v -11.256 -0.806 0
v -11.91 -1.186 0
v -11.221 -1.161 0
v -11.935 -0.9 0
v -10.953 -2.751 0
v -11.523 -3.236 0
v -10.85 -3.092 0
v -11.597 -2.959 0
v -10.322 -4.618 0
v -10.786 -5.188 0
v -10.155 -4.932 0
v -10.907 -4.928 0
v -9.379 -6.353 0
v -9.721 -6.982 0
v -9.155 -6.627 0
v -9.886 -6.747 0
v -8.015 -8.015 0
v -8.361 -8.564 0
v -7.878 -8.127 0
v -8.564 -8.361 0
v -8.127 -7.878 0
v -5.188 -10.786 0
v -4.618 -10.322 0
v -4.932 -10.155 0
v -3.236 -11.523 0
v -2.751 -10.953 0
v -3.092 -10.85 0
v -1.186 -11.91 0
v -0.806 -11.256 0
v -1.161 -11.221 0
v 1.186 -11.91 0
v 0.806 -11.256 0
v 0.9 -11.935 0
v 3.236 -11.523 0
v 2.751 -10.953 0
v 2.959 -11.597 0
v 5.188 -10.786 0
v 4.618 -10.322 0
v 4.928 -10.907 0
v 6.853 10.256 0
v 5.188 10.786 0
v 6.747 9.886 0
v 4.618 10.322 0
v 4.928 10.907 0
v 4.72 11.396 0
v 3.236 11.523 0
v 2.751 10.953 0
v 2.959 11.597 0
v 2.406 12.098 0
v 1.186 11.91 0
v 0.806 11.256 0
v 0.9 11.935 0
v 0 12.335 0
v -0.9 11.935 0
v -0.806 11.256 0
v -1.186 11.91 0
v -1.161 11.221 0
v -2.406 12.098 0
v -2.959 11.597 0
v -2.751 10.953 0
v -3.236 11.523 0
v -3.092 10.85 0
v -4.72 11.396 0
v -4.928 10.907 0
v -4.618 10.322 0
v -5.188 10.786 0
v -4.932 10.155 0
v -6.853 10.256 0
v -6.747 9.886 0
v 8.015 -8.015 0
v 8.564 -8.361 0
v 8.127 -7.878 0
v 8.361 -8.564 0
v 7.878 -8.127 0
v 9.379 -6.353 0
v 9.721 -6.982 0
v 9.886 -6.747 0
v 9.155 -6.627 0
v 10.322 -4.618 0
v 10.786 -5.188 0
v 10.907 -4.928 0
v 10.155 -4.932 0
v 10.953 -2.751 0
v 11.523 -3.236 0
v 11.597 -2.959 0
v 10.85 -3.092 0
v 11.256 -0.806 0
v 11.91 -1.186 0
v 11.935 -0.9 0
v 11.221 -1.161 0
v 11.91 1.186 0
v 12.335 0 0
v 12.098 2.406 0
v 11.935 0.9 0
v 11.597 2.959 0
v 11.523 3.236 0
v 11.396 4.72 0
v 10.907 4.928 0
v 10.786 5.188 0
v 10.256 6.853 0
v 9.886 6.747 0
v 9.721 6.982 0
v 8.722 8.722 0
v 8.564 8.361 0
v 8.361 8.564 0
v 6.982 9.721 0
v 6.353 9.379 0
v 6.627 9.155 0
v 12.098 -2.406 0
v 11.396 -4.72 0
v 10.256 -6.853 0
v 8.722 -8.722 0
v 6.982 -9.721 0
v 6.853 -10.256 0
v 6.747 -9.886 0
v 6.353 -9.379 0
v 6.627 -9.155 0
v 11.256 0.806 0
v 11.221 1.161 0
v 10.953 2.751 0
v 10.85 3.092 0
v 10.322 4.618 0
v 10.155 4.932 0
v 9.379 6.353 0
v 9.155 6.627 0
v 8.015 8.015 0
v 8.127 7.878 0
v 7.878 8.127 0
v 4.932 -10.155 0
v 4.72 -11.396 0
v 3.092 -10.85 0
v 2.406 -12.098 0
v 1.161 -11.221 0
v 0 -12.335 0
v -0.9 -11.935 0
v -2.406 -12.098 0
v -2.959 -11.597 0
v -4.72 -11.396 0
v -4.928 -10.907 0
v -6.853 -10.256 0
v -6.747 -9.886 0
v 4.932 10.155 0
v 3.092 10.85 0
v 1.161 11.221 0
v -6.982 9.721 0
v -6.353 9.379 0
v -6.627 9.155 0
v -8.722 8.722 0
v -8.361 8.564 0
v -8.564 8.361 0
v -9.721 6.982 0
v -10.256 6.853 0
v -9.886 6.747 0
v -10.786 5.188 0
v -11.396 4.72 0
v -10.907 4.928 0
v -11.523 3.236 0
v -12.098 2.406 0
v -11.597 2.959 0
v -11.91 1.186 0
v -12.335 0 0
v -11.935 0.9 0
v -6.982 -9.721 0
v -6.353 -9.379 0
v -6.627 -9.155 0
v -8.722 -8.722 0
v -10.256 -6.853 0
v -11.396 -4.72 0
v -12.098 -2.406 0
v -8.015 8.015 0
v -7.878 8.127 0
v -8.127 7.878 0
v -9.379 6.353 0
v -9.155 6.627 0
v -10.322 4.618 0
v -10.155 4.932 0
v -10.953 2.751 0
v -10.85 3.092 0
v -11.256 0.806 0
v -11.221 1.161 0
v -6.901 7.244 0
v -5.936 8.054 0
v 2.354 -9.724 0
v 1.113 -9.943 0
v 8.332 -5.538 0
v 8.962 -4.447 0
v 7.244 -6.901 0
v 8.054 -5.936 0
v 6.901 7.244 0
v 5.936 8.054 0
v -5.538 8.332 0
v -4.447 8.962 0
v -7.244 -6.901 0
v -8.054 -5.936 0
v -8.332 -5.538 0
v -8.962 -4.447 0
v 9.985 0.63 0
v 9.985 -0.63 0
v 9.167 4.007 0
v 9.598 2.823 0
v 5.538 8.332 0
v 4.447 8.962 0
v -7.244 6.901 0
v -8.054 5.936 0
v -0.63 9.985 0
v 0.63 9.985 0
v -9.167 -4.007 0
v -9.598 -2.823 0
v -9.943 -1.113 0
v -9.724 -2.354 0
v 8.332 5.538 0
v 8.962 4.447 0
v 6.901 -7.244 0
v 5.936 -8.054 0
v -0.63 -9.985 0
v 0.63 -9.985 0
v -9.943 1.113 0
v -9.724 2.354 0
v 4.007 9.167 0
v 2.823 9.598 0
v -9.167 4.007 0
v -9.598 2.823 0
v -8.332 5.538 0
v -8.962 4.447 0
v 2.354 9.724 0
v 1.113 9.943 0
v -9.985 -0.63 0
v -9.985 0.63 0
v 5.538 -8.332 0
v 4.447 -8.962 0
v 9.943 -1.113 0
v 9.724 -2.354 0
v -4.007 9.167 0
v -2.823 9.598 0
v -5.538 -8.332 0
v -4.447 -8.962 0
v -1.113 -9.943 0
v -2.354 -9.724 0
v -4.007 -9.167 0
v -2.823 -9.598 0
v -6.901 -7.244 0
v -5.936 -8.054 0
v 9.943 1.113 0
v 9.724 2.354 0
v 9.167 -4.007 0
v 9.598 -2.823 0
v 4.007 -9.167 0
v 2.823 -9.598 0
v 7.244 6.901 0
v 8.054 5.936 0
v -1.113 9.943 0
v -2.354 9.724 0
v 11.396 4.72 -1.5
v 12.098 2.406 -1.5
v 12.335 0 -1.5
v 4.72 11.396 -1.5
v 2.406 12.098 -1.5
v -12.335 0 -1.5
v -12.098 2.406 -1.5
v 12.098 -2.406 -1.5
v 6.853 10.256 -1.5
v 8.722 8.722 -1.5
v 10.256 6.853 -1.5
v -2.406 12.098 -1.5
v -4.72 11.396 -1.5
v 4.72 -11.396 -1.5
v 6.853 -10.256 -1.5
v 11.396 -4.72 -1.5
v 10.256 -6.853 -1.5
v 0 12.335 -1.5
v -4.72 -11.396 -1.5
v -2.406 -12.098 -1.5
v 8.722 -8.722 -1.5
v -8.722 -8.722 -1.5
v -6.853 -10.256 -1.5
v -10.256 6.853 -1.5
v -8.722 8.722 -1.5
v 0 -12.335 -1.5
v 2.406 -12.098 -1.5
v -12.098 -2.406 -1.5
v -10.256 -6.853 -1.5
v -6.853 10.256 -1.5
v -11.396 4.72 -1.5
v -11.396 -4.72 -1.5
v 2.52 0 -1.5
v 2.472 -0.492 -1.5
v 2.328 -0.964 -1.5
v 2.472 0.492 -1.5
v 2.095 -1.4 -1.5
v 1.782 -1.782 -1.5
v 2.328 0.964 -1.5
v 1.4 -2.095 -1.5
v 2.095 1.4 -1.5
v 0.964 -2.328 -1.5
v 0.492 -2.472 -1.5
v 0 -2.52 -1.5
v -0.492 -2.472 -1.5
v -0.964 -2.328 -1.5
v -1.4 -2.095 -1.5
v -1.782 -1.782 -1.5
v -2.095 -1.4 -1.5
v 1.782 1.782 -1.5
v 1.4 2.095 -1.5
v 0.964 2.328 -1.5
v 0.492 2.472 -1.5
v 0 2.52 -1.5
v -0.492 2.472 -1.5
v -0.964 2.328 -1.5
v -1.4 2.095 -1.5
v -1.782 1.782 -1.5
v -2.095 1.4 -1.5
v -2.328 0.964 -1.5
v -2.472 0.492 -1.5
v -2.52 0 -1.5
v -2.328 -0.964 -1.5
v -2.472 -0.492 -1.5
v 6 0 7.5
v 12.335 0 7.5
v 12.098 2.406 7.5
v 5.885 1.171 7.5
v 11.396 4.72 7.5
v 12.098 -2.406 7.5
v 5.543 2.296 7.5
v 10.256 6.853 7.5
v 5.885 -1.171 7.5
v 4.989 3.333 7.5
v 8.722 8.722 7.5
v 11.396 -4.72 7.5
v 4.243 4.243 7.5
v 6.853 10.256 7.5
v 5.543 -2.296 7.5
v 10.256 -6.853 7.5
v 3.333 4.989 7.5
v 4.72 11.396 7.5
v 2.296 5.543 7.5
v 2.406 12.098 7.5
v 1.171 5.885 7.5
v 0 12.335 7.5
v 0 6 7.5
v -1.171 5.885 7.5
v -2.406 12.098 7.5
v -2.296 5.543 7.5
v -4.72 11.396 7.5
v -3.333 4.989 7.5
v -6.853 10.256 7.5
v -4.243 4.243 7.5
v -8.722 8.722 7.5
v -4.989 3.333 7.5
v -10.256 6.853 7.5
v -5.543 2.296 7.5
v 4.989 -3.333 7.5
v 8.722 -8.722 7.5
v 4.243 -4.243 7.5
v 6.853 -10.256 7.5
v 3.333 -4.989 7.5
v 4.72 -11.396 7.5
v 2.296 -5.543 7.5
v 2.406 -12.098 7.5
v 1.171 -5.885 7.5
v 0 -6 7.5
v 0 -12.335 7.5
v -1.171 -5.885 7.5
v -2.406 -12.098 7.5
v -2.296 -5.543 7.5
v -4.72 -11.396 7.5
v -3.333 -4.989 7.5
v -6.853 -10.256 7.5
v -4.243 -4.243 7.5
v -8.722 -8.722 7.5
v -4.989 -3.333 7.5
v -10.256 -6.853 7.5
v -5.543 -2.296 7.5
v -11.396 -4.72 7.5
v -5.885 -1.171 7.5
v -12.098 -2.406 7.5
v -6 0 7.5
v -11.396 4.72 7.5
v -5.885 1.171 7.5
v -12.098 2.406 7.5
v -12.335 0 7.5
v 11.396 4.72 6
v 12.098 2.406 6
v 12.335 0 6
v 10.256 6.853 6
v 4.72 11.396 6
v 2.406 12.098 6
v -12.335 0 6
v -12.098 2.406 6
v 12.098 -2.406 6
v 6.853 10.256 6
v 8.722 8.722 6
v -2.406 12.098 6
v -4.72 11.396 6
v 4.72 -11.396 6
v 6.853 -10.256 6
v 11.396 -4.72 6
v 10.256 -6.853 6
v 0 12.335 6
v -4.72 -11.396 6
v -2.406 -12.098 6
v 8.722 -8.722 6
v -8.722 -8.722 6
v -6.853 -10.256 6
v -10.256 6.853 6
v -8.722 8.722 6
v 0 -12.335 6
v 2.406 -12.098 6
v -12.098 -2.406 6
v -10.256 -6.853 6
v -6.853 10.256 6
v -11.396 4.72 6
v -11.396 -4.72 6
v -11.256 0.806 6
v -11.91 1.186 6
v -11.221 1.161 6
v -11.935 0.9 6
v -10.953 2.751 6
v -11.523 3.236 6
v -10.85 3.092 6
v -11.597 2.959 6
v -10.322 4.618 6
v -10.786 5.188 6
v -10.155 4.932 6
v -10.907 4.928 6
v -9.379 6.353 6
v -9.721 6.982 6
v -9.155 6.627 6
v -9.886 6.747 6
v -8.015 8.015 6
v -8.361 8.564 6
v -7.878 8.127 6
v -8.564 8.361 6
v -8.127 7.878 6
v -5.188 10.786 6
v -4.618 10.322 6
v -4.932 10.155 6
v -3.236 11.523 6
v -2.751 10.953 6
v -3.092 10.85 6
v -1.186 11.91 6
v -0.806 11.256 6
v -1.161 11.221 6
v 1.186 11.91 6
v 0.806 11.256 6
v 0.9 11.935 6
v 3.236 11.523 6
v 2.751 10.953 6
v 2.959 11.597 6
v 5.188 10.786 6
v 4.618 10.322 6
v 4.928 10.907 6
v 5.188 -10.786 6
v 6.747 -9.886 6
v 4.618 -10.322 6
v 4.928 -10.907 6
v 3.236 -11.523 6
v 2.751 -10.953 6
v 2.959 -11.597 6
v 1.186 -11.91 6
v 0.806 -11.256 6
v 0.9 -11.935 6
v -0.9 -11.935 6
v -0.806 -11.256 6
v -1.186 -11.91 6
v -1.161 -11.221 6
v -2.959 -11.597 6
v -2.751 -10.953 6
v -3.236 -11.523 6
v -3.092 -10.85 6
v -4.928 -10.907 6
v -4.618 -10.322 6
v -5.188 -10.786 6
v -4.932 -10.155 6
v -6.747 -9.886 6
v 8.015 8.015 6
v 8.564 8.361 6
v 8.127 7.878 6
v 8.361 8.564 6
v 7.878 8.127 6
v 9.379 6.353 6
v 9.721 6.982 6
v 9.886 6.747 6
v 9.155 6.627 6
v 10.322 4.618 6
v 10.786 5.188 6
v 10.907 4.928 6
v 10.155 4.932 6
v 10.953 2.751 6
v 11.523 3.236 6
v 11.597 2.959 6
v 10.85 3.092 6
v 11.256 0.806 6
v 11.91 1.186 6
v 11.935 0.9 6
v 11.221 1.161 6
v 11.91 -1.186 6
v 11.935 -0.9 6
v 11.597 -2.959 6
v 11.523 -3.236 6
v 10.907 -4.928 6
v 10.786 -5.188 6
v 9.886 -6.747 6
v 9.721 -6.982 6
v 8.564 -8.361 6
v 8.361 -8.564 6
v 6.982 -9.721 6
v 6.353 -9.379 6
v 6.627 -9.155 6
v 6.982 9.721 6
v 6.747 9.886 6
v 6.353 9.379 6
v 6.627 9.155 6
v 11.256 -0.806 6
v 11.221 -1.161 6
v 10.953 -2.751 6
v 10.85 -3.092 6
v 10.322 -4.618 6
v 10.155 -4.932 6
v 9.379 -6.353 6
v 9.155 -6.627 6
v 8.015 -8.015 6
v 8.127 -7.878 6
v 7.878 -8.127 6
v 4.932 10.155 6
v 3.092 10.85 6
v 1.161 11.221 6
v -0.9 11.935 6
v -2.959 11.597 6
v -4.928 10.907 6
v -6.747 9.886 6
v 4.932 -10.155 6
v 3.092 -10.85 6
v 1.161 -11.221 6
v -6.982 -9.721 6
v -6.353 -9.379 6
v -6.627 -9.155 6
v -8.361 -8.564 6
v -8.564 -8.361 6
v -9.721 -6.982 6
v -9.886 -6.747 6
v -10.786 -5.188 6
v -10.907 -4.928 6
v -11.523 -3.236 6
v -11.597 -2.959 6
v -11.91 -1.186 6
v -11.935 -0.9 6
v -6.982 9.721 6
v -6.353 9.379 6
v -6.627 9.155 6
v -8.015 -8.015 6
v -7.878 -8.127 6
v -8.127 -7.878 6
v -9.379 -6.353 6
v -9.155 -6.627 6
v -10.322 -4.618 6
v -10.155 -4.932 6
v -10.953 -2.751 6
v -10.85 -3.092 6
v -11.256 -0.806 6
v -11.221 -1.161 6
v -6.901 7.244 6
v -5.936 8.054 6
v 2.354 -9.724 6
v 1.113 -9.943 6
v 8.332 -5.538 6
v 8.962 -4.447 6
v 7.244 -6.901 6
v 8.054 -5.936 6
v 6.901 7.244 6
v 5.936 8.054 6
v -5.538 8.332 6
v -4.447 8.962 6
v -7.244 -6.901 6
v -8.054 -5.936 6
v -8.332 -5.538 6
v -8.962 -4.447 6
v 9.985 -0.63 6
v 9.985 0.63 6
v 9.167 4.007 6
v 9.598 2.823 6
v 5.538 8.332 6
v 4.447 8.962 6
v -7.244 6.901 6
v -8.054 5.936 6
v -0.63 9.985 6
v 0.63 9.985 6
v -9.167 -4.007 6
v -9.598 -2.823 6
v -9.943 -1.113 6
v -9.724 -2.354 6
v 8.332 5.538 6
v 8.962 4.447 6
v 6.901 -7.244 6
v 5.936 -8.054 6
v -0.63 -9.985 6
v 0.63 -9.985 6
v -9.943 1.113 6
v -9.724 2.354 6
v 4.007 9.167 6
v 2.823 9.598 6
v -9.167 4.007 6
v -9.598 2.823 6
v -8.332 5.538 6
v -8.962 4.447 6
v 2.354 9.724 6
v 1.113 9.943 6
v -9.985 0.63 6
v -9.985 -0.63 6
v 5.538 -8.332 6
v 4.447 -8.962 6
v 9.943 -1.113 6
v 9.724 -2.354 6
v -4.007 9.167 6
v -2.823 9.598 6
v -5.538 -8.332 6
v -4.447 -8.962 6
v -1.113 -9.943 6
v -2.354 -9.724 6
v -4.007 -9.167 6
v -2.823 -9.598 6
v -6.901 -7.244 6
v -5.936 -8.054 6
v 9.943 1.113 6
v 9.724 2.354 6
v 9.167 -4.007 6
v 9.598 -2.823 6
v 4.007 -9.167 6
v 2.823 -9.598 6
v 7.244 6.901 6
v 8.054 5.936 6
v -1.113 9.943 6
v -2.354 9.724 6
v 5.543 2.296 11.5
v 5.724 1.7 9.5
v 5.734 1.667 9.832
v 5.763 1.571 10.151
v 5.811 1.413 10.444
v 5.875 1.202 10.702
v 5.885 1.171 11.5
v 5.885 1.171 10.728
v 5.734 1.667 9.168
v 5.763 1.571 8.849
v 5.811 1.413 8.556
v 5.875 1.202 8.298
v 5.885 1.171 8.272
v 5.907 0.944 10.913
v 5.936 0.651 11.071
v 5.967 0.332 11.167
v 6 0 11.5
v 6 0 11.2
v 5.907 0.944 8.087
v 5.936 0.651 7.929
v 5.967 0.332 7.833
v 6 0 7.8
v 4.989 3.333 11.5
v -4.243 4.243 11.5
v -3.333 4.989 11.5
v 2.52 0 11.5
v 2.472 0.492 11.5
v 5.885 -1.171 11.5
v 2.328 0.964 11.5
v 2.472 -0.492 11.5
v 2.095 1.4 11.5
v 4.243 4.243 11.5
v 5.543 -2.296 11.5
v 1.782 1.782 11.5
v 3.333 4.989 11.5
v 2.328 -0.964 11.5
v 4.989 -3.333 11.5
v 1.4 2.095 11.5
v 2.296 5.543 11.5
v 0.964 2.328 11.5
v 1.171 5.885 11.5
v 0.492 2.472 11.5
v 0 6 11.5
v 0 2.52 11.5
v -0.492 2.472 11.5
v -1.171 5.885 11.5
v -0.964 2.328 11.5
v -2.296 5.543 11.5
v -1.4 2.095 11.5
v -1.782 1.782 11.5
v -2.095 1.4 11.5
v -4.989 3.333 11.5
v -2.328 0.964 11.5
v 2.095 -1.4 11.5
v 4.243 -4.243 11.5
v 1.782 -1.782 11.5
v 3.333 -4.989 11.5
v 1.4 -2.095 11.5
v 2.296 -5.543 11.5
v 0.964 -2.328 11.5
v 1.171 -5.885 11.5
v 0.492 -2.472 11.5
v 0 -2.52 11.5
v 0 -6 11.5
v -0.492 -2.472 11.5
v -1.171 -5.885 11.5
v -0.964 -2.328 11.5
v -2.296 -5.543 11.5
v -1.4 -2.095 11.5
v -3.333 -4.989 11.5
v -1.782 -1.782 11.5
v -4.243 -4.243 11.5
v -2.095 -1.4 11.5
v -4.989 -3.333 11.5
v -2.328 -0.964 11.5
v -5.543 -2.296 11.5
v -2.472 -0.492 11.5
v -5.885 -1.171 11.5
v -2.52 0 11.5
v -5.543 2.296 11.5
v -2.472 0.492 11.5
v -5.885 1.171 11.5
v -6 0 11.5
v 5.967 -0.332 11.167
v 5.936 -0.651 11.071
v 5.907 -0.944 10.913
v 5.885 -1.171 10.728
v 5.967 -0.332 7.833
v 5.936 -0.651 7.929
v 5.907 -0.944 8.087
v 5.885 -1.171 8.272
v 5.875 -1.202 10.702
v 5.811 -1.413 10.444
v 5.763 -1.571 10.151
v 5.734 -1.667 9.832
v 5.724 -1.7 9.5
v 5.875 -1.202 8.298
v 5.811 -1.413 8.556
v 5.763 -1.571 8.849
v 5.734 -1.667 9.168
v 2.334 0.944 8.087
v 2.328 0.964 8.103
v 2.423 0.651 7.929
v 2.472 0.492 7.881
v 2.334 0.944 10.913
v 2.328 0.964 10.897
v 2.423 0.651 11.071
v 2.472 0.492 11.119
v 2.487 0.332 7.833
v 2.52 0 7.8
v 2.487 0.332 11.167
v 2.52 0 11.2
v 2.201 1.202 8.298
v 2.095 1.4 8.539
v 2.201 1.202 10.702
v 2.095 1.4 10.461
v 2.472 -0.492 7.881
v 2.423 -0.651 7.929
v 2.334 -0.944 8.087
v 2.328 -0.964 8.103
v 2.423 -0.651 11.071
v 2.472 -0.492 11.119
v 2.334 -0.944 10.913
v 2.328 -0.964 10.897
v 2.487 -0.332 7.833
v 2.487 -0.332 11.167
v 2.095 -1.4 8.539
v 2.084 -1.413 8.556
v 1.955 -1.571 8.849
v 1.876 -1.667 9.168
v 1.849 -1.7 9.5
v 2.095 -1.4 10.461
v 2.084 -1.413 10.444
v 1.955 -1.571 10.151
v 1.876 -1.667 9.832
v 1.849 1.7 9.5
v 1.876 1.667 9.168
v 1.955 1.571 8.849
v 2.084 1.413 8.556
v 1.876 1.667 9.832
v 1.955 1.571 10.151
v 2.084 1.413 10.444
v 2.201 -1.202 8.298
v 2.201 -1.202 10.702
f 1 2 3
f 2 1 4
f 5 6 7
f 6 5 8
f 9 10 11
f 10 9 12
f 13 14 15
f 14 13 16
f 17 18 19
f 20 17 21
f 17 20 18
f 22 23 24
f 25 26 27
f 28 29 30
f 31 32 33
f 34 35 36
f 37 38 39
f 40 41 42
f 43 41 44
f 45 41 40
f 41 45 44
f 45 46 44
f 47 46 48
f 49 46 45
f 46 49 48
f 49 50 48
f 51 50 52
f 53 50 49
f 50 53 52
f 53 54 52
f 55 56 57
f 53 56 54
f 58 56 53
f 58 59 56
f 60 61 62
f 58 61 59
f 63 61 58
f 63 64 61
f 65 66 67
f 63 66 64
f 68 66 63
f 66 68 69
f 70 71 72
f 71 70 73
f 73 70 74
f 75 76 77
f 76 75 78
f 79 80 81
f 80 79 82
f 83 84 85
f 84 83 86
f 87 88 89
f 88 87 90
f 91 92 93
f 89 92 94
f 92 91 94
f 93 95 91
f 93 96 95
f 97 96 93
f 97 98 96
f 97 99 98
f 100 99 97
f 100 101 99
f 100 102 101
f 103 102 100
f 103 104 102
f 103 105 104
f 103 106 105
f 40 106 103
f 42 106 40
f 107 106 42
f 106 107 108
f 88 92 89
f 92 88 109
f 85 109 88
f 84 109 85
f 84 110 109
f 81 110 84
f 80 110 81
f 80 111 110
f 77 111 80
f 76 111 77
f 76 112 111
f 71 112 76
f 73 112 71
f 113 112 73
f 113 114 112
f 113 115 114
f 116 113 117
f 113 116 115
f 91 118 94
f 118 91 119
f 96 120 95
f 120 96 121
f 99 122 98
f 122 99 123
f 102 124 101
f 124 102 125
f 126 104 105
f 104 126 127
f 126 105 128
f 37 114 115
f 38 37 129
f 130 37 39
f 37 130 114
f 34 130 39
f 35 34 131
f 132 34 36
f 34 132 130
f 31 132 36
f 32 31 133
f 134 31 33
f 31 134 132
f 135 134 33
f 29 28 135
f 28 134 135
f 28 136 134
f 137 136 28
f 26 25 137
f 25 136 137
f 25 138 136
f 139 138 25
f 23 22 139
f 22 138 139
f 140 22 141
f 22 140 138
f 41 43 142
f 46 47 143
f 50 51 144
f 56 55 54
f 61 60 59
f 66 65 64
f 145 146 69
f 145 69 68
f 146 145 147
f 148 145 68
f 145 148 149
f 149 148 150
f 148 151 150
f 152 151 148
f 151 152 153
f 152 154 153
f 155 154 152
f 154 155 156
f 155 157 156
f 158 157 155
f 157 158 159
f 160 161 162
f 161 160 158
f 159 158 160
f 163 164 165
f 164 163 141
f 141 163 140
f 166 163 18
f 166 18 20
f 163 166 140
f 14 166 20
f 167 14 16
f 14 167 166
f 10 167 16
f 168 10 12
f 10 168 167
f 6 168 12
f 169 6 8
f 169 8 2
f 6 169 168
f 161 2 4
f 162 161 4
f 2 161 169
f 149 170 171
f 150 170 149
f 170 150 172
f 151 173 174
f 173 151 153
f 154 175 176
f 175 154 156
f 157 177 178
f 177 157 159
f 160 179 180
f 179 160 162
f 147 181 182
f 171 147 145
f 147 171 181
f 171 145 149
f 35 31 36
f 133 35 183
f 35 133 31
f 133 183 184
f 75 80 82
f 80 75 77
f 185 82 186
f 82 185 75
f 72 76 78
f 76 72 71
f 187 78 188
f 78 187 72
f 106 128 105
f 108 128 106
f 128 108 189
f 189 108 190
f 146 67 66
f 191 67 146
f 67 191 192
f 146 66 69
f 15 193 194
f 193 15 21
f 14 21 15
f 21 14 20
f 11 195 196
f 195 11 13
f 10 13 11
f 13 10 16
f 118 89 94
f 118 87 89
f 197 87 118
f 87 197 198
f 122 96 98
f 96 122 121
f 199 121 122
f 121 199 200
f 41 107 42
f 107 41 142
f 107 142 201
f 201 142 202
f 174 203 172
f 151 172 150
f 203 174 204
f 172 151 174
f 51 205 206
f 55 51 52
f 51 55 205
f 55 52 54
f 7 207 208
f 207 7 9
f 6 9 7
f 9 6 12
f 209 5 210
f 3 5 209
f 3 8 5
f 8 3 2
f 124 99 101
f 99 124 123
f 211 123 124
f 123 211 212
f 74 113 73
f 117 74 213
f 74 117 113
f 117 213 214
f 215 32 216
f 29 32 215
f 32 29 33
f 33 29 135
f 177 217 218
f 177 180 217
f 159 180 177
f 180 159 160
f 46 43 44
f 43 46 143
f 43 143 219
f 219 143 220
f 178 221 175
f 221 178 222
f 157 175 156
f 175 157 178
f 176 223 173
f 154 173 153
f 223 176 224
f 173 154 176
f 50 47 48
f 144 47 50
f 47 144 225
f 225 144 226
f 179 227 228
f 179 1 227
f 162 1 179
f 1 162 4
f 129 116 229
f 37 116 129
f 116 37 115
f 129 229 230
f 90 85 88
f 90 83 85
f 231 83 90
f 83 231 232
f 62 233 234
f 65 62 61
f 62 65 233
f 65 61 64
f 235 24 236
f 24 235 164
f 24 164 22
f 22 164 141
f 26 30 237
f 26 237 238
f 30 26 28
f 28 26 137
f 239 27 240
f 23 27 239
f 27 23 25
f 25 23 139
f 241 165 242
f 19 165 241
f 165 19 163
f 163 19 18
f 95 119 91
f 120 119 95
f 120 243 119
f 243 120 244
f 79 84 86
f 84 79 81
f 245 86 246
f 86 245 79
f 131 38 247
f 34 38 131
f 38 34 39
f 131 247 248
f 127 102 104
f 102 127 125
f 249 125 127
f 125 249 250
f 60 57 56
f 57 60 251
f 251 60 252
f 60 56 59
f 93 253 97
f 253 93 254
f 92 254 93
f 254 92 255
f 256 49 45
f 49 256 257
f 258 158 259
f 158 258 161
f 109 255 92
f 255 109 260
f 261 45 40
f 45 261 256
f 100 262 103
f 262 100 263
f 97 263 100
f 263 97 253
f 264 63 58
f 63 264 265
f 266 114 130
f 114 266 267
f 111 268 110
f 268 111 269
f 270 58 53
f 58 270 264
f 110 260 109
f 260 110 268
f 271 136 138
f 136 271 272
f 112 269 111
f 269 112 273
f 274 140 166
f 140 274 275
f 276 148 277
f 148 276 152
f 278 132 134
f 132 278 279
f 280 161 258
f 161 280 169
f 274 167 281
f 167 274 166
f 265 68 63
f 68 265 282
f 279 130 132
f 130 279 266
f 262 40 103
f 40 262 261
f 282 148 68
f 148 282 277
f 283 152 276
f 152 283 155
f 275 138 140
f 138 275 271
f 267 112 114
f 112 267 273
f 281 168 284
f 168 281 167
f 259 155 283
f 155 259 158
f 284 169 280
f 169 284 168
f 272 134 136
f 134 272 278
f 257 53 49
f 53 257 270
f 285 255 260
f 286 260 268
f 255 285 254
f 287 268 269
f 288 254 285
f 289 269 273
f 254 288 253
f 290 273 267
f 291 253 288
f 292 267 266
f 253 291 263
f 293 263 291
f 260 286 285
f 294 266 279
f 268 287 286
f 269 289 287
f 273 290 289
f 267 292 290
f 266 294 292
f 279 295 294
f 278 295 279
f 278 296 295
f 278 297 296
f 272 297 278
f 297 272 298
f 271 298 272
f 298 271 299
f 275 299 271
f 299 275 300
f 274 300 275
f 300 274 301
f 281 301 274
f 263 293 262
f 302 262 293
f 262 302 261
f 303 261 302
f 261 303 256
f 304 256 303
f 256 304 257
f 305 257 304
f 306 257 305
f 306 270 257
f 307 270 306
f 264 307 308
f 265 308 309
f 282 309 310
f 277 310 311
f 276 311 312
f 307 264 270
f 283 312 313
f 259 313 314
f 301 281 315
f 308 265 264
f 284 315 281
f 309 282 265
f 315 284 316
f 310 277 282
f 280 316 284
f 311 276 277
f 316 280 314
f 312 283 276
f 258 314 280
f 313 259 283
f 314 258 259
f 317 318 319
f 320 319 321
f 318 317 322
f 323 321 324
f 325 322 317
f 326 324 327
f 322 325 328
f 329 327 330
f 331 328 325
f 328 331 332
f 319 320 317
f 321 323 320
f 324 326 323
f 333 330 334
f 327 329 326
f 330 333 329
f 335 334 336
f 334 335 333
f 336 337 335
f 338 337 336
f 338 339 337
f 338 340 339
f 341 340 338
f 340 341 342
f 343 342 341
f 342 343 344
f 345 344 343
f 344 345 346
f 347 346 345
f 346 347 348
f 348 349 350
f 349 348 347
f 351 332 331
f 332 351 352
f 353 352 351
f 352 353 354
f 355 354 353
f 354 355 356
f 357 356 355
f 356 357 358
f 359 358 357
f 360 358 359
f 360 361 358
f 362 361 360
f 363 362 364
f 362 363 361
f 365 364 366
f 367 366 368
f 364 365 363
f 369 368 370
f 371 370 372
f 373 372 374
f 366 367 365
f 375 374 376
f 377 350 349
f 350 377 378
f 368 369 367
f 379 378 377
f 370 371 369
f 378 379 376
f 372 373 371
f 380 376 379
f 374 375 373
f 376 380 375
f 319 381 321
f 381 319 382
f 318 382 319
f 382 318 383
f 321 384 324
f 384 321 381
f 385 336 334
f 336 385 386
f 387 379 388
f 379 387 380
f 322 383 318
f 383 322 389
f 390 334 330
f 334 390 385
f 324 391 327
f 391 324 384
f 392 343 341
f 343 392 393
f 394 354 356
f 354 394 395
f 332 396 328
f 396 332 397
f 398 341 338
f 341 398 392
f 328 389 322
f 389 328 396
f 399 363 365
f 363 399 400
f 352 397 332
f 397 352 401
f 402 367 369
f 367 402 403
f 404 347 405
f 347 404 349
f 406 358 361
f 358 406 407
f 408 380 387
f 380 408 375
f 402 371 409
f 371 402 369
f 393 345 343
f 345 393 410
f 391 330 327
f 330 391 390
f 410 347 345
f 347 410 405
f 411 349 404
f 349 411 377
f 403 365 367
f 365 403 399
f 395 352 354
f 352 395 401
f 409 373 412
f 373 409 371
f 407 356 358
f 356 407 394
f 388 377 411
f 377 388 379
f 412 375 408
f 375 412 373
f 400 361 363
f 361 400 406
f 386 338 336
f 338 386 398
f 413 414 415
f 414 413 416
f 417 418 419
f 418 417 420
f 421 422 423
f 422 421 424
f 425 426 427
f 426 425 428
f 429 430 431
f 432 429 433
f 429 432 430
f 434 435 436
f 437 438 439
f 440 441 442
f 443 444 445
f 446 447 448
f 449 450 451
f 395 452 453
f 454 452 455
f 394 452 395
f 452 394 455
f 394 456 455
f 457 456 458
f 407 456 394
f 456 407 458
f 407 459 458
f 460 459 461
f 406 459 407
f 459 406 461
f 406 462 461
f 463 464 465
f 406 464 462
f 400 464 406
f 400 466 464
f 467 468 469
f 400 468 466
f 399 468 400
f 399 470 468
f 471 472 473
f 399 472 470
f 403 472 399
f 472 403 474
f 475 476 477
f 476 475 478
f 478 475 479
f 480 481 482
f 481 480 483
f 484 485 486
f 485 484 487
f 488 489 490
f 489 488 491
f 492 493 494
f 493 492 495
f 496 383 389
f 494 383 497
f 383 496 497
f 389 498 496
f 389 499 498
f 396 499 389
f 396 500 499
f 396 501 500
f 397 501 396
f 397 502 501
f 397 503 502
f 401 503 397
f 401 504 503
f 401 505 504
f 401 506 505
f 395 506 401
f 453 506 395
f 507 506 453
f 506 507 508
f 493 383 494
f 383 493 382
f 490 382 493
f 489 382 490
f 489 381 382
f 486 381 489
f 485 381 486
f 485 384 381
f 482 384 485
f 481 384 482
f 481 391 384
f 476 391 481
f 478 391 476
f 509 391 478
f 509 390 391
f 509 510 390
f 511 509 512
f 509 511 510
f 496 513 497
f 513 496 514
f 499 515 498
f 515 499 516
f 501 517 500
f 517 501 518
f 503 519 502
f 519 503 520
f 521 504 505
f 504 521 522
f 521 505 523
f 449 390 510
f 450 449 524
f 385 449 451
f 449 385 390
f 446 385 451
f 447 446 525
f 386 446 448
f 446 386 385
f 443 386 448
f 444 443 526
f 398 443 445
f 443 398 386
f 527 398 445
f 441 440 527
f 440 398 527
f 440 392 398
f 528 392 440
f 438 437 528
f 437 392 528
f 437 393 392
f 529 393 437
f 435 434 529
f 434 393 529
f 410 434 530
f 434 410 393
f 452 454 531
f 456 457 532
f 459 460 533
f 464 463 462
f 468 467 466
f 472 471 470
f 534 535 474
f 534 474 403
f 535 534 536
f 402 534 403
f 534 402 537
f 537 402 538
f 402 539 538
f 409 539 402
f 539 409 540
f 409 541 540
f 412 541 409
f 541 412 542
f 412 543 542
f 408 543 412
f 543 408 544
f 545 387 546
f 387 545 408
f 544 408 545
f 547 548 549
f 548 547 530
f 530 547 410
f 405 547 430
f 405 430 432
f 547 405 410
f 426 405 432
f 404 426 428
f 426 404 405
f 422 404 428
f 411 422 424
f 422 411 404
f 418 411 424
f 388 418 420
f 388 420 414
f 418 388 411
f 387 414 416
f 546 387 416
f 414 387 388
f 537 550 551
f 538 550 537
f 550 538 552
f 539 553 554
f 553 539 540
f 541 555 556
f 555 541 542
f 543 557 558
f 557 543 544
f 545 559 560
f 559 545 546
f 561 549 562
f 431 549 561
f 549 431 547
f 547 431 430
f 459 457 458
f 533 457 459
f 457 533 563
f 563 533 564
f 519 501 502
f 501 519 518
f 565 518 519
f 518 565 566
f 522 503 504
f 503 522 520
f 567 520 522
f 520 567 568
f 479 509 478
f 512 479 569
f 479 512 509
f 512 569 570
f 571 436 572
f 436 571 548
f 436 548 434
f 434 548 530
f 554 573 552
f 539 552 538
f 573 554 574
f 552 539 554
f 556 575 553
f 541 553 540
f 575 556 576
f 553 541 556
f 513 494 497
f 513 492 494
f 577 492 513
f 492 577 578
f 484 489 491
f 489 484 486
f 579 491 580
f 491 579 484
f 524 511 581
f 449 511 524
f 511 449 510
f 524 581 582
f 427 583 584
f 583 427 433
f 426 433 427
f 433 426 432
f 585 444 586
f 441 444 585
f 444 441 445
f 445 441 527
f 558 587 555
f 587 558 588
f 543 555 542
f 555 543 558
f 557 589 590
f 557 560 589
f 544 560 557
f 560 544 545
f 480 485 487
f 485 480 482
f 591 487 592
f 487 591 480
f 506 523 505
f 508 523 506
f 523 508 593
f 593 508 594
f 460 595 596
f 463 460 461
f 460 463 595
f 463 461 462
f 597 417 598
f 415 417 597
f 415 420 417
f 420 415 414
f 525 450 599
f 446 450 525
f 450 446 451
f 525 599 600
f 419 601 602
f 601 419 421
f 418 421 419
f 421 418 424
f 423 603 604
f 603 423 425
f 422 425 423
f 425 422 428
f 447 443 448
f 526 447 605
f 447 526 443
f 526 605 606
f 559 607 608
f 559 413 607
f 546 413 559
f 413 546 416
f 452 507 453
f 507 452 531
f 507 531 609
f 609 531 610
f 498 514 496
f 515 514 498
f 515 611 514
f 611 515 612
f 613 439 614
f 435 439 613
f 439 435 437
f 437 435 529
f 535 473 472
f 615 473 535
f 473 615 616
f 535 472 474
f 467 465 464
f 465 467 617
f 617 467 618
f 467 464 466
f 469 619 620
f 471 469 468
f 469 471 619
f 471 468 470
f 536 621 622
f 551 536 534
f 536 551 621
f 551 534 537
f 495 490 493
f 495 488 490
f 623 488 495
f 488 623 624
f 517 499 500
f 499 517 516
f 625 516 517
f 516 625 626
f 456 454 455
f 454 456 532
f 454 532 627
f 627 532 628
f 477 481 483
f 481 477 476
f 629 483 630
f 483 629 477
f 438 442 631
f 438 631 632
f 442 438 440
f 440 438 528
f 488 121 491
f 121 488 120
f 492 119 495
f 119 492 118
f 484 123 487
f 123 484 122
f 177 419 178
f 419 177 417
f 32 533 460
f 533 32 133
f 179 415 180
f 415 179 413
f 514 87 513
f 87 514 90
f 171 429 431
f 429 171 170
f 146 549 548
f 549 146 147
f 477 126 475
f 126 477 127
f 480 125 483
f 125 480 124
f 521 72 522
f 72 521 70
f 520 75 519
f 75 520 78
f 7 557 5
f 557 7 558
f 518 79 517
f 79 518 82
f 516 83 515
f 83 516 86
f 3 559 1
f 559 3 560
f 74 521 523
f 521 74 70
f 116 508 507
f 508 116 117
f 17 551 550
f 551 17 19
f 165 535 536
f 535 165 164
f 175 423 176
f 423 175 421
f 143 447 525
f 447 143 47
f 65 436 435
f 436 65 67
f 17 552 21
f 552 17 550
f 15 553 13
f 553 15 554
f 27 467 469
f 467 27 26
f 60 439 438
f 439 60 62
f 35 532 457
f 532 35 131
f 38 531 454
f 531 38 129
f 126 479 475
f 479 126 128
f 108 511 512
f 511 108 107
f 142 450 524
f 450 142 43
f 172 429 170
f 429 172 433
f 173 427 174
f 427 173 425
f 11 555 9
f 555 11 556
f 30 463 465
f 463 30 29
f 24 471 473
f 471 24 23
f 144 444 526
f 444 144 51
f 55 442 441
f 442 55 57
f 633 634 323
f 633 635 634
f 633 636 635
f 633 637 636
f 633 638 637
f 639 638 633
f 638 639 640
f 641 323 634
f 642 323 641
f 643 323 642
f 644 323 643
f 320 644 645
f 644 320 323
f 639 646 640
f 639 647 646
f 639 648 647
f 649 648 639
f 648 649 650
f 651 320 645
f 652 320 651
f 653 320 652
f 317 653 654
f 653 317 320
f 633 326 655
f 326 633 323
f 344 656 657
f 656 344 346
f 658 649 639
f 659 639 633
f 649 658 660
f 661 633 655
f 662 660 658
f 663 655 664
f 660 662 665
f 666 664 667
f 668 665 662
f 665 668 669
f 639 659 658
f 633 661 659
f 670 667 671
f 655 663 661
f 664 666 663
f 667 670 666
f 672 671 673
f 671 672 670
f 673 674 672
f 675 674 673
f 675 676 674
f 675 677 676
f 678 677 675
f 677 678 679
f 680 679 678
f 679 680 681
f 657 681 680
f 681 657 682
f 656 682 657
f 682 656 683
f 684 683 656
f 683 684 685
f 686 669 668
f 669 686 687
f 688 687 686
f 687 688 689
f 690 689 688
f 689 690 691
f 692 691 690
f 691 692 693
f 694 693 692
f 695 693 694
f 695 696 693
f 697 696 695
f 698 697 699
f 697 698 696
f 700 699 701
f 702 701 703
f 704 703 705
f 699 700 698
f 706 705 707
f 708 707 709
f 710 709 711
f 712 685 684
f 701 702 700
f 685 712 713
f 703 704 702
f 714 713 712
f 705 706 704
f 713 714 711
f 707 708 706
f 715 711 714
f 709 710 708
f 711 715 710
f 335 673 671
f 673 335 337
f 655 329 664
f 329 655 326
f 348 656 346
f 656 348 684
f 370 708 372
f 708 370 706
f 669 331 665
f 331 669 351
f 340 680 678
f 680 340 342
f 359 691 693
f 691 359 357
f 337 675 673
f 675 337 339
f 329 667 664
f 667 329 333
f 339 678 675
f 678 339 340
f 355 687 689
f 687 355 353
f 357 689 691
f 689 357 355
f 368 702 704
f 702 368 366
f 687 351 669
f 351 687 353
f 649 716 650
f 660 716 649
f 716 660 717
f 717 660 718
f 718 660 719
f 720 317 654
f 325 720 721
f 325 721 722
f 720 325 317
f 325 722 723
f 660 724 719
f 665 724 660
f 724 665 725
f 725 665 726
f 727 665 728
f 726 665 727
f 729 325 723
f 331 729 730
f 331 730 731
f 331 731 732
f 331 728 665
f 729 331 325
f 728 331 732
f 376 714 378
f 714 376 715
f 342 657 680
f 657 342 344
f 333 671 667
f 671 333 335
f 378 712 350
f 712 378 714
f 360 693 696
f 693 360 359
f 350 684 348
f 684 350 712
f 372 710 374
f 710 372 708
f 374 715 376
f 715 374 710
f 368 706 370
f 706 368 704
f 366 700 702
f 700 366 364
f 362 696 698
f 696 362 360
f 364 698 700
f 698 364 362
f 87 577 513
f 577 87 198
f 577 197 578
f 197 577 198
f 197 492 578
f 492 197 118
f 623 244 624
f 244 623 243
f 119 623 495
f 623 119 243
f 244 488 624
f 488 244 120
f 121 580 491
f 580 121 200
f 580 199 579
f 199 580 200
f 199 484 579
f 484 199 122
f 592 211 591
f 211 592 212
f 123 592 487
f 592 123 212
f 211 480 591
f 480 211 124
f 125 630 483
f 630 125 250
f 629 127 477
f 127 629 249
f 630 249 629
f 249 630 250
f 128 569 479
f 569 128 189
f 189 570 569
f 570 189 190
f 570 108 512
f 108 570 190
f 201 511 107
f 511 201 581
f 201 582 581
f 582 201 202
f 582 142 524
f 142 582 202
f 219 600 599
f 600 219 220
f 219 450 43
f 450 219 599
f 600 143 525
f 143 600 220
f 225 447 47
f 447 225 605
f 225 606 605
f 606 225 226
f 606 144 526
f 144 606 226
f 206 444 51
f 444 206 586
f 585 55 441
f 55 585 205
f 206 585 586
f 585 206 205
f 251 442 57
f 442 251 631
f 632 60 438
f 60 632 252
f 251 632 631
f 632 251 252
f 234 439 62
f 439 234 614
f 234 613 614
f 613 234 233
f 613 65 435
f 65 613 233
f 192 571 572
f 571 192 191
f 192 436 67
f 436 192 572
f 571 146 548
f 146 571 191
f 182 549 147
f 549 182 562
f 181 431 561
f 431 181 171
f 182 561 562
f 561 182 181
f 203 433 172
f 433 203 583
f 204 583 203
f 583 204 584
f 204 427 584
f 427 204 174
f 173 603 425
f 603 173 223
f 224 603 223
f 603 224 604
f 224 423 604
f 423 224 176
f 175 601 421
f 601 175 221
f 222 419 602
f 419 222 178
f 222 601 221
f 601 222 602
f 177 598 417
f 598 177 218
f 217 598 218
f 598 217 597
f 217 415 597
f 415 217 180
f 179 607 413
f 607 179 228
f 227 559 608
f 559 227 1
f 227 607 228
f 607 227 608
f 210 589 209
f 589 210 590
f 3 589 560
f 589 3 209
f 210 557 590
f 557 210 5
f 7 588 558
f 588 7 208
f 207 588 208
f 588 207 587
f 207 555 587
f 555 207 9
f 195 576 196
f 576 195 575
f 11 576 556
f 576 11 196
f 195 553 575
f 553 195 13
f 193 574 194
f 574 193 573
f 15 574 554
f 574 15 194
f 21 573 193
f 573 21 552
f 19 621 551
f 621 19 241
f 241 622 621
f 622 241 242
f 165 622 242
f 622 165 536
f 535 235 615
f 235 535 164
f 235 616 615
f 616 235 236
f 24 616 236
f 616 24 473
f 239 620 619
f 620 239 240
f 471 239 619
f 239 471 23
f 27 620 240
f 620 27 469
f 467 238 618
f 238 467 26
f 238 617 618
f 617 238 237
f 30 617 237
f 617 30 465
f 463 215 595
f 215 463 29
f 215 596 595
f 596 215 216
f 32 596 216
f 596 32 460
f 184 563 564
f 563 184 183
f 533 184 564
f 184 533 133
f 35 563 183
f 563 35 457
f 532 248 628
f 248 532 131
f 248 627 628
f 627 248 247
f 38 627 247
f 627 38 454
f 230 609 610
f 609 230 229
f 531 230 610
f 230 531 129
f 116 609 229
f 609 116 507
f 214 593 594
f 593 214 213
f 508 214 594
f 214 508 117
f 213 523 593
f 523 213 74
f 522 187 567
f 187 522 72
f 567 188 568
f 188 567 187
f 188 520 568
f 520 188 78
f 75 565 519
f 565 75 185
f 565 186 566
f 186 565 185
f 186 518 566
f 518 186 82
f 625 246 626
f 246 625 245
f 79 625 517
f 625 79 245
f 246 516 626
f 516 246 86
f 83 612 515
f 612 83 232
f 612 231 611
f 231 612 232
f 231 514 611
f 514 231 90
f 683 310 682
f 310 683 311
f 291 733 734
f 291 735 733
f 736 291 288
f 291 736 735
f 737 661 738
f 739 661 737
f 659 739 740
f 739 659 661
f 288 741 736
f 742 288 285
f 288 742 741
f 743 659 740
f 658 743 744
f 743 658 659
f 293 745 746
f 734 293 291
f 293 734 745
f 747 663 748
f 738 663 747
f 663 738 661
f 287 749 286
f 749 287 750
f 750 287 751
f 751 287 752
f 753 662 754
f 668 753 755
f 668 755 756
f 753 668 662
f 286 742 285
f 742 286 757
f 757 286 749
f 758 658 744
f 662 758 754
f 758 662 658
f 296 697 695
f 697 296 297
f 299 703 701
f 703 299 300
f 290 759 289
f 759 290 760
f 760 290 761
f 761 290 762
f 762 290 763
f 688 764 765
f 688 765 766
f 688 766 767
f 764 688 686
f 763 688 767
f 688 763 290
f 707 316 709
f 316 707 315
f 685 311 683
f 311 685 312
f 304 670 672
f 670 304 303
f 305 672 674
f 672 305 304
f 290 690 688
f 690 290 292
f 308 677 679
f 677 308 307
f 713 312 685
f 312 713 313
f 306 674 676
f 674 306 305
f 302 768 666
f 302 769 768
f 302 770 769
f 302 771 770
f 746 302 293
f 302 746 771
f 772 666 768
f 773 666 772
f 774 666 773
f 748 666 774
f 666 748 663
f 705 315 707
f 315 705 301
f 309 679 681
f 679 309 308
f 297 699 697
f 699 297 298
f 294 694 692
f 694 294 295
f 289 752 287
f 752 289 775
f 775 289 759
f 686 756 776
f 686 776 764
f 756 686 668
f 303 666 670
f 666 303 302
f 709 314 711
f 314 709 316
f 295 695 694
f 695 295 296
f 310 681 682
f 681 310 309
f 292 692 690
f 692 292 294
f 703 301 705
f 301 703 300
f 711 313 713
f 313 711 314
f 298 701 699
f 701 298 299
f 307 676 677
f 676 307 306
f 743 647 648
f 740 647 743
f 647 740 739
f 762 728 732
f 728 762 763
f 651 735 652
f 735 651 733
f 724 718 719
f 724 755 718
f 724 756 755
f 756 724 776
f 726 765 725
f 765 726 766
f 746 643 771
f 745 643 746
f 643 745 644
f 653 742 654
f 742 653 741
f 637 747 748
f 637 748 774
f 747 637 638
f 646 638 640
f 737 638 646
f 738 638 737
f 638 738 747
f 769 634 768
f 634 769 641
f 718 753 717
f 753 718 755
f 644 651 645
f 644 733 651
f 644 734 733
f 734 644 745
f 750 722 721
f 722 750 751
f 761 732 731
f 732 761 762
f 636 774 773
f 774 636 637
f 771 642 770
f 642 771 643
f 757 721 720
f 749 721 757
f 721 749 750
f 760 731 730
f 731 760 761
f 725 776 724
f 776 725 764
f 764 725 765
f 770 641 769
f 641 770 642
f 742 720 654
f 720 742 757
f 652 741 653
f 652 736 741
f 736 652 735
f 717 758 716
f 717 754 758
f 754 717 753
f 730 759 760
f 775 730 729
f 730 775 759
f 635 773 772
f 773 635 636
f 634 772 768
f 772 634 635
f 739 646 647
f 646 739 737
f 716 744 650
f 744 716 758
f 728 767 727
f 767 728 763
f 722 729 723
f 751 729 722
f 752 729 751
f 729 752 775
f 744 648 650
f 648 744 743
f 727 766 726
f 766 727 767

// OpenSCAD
$fn = 32;

// ----------------------------------------------------------------------
// Timing pulley: GT2 36T, pitch 2 mm, 24.67 mm x 13 mm
// ----------------------------------------------------------------------

// --- parameters (mm) ---
belt_pitch = 2;           // belt pitch
n_teeth = 36;             // number of grooves
rim_w = 6;                // belt width between the flanges
tip_d = 22.67;            // tip circle diameter
root_d = 21.17;           // groove bottom diameter
groove_h = 0.75;          // groove depth
tooth_w = 1.5;            // groove width at the tip circle
rim_d = 24.67;            // flange diameter
rim_t = 1.5;              // flange thickness
spigot_d = 19.57;         // flange spigot, sunk into the rim
spigot_h = 1.2;           // spigot depth into the rim
shaft_d = 5.04;           // shaft bore
hub_d = 12;               // hub diameter
hub_h = 4;                // hub above the flange
bottom_z = -1.5;          // lowest point of the pulley
top_z = 11.5;             // highest point of the pulley
set_d = 3.4;              // set screw tap hole

module rim() {
  cylinder(h = rim_w, d = tip_d);
}

module groove_cutter() {
  /* belt tooth groove: deeper than wide, cut through the belt width */
  translate([root_d / 2, 0, 0])
    linear_extrude(height = rim_w)
      polygon(points = [[-0.6, -tooth_w * 0.42], [groove_h + 0.6, -tooth_w * 0.6],
                        [groove_h + 0.6, tooth_w * 0.6], [-0.6, tooth_w * 0.42]]);
}

module flanges() {
  translate([0, 0, -rim_t]) cylinder(h = rim_t, d = rim_d);
  translate([0, 0, rim_w]) cylinder(h = rim_t, d = rim_d);
  translate([0, 0, -spigot_h]) cylinder(h = spigot_h + 0.6, d = spigot_d);
  translate([0, 0, rim_w - 0.6]) cylinder(h = spigot_h + 0.6, d = spigot_d);
}

module hub() {
  translate([0, 0, bottom_z]) cylinder(h = top_z - bottom_z, d = hub_d);
}

difference() {
  union() {
    rim();
    hub();
    flanges();
  }
  for (i = [0 : n_teeth - 1]) rotate([0, 0, i * 360 / n_teeth]) groove_cutter();
  translate([0, 0, bottom_z - 1]) cylinder(h = top_z - bottom_z + 2, d = shaft_d);
  translate([-1, 0, top_z - hub_h * 0.5]) rotate([0, 90, 0]) cylinder(h = hub_d / 2 + 3, d = set_d);
}
